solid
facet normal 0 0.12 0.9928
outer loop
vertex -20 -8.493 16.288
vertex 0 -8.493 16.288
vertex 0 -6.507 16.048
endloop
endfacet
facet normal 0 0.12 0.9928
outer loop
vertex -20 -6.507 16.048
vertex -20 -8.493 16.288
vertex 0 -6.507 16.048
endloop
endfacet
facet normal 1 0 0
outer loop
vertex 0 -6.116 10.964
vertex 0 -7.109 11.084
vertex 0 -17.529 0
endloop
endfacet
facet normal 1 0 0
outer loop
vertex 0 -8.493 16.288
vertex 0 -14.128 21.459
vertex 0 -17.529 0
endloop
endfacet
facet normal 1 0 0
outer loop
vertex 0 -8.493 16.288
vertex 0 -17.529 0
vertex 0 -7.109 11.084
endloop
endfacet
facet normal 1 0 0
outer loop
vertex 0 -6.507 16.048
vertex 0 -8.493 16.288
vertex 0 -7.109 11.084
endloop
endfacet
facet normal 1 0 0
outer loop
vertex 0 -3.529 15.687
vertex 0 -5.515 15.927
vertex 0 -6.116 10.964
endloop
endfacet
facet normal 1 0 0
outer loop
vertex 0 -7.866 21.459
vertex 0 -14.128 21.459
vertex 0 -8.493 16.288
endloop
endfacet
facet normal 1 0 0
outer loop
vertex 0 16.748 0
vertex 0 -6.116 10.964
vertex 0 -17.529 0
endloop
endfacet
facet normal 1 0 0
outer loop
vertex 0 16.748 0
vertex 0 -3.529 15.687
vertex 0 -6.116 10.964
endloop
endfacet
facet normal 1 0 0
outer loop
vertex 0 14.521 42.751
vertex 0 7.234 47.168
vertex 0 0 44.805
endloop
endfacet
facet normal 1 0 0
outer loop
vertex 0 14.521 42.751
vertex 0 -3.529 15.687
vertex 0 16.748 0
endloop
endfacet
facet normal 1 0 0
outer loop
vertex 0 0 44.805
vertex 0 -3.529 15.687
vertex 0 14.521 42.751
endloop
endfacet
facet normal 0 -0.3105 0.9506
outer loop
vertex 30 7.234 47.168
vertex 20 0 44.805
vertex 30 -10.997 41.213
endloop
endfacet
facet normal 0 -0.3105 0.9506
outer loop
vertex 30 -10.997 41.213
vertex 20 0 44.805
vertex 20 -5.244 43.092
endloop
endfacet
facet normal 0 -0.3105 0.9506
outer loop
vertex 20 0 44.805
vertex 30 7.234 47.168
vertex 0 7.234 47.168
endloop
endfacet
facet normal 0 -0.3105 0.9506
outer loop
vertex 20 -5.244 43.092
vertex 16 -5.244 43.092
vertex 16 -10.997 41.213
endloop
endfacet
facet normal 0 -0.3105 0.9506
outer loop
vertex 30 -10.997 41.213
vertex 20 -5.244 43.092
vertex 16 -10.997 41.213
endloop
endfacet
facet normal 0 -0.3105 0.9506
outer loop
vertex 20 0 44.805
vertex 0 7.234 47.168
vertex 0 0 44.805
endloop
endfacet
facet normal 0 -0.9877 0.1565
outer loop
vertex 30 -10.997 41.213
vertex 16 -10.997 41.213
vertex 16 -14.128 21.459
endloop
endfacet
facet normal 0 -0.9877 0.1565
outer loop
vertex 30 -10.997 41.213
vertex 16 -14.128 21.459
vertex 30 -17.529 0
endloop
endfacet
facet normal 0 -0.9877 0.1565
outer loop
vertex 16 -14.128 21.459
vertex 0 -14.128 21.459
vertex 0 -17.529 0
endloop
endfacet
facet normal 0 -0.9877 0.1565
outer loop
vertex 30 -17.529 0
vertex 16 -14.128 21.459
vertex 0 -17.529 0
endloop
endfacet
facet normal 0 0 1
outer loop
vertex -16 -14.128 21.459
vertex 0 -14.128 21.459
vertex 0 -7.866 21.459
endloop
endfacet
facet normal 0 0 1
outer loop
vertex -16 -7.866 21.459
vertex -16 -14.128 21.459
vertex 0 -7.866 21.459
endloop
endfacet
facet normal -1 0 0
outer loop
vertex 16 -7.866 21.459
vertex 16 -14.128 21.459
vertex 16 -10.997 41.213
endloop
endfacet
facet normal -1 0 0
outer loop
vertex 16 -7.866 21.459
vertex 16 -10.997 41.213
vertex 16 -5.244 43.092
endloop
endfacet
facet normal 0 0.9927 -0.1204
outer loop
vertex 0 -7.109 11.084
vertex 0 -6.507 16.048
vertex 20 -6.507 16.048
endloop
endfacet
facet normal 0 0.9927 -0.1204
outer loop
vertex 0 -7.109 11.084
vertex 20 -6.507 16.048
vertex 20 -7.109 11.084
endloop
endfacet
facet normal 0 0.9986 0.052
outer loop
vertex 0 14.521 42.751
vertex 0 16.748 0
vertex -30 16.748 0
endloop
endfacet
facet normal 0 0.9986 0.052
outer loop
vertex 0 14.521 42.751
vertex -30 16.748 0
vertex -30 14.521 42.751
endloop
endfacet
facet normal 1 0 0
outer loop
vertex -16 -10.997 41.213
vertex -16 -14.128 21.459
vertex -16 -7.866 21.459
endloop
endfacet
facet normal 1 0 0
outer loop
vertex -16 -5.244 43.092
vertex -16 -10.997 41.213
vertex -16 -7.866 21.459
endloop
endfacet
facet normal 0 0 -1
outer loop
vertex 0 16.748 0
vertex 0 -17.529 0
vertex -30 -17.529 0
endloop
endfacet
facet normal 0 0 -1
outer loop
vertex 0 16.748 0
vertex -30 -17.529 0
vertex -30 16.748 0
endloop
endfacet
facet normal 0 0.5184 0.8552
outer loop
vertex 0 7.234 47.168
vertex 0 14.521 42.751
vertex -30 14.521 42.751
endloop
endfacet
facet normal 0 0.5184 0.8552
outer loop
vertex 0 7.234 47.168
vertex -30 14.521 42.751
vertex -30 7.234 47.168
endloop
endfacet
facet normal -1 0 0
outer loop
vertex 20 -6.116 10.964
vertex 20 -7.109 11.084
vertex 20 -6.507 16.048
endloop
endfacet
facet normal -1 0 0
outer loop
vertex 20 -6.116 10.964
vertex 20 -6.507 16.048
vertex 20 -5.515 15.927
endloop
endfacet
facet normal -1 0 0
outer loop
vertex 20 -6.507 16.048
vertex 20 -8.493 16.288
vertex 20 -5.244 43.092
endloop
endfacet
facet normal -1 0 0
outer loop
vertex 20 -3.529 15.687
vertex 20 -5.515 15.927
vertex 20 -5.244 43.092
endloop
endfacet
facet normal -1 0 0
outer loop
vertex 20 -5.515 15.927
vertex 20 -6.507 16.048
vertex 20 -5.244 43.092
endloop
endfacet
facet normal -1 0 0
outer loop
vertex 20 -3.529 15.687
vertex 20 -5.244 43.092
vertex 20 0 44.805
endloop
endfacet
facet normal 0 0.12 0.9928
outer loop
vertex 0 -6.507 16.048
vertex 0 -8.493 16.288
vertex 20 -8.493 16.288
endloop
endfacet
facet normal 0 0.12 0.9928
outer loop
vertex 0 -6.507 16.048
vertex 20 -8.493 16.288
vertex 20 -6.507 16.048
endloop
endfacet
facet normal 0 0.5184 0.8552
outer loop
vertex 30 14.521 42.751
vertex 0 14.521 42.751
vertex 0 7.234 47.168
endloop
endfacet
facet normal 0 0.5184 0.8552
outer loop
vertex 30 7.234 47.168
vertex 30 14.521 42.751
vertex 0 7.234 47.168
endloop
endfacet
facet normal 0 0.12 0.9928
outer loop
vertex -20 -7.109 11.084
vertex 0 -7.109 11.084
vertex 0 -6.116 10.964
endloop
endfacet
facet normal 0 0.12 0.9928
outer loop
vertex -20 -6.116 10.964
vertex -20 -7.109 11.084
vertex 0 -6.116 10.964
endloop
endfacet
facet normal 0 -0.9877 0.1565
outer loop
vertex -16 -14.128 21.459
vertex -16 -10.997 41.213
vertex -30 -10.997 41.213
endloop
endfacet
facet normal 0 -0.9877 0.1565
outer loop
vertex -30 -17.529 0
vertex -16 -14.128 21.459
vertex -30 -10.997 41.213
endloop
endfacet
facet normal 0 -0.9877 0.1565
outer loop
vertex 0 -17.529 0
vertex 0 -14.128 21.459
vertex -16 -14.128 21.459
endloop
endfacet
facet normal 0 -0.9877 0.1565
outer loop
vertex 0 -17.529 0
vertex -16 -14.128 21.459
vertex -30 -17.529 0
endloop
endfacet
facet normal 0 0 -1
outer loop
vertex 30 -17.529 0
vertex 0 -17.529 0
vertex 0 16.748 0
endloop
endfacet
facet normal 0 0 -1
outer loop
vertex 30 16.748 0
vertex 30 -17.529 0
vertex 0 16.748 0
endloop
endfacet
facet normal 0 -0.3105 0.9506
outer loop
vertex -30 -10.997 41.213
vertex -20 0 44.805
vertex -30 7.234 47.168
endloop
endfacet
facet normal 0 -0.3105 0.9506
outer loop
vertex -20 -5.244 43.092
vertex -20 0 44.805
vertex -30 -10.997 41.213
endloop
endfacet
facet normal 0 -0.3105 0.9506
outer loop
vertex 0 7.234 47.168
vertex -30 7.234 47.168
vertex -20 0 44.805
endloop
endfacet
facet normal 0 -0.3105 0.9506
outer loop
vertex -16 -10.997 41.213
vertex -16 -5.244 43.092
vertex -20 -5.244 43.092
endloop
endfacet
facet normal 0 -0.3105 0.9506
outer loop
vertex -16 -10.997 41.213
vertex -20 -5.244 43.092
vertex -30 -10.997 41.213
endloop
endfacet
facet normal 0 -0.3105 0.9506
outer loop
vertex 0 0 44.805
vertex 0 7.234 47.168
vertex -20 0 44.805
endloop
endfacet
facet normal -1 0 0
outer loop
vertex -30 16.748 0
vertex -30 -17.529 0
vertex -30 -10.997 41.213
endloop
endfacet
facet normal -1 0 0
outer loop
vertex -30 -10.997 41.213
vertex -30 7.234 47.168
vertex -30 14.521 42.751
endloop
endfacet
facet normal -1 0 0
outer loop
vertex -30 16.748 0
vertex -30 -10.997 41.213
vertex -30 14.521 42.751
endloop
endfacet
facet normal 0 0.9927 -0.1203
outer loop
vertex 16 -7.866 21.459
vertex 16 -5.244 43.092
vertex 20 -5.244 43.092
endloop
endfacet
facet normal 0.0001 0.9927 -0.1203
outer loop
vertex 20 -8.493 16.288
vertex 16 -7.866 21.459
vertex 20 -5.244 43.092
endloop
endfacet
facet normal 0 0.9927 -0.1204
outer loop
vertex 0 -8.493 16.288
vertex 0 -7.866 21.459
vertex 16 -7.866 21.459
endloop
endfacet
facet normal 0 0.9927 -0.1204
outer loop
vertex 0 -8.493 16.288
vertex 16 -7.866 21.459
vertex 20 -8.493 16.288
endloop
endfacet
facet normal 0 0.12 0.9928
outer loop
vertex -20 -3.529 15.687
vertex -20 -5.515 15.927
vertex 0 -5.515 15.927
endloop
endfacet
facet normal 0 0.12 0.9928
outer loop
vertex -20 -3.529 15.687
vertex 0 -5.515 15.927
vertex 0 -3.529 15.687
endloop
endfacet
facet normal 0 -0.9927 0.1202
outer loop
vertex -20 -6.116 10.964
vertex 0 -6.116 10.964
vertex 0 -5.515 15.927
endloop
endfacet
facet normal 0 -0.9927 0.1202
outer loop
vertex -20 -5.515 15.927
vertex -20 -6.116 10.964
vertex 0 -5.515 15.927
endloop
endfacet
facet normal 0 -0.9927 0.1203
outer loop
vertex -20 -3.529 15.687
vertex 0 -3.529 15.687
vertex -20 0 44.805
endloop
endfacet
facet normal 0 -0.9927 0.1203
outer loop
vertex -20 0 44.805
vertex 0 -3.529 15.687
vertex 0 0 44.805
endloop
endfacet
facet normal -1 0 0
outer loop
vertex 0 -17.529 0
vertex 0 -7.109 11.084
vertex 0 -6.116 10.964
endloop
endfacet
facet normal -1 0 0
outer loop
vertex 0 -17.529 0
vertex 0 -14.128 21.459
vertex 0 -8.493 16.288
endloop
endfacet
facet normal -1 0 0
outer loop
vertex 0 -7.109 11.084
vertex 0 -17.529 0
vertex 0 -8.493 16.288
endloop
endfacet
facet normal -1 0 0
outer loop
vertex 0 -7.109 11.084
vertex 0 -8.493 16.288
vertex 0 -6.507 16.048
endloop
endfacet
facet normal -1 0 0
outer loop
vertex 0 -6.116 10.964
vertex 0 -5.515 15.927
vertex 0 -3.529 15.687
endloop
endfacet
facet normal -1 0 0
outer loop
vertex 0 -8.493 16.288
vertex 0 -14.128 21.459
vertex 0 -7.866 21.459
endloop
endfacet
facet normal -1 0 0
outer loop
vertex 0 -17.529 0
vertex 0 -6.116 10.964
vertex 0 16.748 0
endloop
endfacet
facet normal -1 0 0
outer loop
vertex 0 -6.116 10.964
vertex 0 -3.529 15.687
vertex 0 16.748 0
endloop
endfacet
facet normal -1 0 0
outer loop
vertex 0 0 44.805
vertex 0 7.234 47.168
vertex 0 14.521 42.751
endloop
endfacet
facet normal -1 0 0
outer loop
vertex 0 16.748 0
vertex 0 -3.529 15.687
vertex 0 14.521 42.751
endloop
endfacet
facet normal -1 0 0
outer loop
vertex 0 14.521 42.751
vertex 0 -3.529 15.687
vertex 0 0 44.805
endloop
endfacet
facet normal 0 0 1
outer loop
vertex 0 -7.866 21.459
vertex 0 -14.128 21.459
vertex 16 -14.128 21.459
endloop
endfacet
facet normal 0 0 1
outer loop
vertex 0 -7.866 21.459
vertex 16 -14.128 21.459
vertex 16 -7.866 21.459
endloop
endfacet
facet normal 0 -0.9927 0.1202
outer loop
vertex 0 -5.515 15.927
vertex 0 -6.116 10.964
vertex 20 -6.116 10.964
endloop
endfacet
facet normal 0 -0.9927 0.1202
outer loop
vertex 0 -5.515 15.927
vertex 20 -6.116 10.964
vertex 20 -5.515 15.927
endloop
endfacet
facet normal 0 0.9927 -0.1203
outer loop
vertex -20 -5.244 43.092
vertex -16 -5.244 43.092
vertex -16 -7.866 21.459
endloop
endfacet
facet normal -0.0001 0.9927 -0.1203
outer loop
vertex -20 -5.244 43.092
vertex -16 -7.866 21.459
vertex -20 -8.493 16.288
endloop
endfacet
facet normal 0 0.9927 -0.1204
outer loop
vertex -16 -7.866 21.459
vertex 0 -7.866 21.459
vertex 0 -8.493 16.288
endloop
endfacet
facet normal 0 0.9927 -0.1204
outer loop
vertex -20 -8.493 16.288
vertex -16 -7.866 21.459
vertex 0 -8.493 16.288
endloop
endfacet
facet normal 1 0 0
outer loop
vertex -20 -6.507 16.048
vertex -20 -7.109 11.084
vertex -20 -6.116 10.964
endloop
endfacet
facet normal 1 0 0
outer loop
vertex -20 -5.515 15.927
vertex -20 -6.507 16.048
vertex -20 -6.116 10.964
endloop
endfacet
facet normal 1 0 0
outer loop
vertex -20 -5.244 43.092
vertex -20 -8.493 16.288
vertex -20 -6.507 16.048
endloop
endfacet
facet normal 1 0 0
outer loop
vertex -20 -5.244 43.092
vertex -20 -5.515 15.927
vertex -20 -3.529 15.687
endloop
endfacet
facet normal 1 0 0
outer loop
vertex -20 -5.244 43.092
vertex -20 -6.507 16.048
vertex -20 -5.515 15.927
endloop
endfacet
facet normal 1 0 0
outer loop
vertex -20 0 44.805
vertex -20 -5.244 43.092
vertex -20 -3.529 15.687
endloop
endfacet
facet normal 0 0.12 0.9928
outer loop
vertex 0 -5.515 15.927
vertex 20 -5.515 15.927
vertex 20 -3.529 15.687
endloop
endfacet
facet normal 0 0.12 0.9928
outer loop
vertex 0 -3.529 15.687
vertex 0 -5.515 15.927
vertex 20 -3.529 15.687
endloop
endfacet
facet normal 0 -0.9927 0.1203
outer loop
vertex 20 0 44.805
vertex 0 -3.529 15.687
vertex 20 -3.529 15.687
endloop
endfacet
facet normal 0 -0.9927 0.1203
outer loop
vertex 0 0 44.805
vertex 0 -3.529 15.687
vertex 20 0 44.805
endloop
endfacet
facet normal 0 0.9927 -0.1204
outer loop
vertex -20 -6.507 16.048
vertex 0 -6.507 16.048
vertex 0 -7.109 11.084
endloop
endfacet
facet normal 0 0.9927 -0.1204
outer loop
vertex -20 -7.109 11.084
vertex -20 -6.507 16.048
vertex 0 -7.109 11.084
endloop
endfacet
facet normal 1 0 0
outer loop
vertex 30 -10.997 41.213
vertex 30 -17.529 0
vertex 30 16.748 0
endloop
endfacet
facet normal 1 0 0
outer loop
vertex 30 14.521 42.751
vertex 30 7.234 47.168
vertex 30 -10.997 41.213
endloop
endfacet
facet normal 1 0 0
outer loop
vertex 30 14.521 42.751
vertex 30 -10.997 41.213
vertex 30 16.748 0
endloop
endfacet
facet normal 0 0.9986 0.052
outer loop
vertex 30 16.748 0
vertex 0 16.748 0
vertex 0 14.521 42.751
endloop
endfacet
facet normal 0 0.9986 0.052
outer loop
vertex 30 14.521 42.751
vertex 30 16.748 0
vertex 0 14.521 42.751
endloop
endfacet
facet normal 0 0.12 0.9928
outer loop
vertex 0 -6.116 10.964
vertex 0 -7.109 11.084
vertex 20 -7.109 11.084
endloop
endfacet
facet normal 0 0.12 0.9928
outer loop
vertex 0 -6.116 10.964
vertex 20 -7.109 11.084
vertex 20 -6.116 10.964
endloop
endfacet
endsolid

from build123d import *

# Parameters (mm, degrees)
F1_DEPTH = 30
F3_DEPTH = 20
F5_DEPTH = 16


with BuildPart() as f1:
    # F0 (on Right) → F1 (new body)
    with BuildSketch(Plane.YZ):
        Polygon((-17.5289604813, 0), (7.9001290724, 0), (16.7479291558, 0), (14.5212650044, 42.7511196038), (7.2340909392, 47.1681281924), (-10.9974298997, 41.2129498842), align=None)
    extrude(amount=-F1_DEPTH)

    # F2 (on face) → F3 (cut)
    with BuildSketch(Plane.YZ):
        Polygon((0, 44.8051711017), (-5.2442131429, 43.0921914425), (-8.4929573007, 16.2883547508), (-6.5074879162, 16.0477070354), (-7.1091072047, 11.084033574), (-6.1163725124, 10.9637097163), (-5.5147532239, 15.9273831777), (-3.5292838393, 15.6867354623), align=None)
    extrude(amount=-F3_DEPTH, mode=Mode.SUBTRACT)

    # F4 (on face) → F5 (cut)
    with BuildSketch(Plane.YZ):
        Polygon((-10.9974298997, 41.2129498842), (-14.1280084526, 21.459482393), (-7.8661936434, 21.459482393), (-5.2442131429, 43.0921914425), align=None)
    extrude(amount=-F5_DEPTH, mode=Mode.SUBTRACT)


with BuildPart() as f6_1:
    # F6: instance of F1
    add(f1.part.mirror(Plane.YZ))


solid = Compound([f1.part, f6_1.part])
